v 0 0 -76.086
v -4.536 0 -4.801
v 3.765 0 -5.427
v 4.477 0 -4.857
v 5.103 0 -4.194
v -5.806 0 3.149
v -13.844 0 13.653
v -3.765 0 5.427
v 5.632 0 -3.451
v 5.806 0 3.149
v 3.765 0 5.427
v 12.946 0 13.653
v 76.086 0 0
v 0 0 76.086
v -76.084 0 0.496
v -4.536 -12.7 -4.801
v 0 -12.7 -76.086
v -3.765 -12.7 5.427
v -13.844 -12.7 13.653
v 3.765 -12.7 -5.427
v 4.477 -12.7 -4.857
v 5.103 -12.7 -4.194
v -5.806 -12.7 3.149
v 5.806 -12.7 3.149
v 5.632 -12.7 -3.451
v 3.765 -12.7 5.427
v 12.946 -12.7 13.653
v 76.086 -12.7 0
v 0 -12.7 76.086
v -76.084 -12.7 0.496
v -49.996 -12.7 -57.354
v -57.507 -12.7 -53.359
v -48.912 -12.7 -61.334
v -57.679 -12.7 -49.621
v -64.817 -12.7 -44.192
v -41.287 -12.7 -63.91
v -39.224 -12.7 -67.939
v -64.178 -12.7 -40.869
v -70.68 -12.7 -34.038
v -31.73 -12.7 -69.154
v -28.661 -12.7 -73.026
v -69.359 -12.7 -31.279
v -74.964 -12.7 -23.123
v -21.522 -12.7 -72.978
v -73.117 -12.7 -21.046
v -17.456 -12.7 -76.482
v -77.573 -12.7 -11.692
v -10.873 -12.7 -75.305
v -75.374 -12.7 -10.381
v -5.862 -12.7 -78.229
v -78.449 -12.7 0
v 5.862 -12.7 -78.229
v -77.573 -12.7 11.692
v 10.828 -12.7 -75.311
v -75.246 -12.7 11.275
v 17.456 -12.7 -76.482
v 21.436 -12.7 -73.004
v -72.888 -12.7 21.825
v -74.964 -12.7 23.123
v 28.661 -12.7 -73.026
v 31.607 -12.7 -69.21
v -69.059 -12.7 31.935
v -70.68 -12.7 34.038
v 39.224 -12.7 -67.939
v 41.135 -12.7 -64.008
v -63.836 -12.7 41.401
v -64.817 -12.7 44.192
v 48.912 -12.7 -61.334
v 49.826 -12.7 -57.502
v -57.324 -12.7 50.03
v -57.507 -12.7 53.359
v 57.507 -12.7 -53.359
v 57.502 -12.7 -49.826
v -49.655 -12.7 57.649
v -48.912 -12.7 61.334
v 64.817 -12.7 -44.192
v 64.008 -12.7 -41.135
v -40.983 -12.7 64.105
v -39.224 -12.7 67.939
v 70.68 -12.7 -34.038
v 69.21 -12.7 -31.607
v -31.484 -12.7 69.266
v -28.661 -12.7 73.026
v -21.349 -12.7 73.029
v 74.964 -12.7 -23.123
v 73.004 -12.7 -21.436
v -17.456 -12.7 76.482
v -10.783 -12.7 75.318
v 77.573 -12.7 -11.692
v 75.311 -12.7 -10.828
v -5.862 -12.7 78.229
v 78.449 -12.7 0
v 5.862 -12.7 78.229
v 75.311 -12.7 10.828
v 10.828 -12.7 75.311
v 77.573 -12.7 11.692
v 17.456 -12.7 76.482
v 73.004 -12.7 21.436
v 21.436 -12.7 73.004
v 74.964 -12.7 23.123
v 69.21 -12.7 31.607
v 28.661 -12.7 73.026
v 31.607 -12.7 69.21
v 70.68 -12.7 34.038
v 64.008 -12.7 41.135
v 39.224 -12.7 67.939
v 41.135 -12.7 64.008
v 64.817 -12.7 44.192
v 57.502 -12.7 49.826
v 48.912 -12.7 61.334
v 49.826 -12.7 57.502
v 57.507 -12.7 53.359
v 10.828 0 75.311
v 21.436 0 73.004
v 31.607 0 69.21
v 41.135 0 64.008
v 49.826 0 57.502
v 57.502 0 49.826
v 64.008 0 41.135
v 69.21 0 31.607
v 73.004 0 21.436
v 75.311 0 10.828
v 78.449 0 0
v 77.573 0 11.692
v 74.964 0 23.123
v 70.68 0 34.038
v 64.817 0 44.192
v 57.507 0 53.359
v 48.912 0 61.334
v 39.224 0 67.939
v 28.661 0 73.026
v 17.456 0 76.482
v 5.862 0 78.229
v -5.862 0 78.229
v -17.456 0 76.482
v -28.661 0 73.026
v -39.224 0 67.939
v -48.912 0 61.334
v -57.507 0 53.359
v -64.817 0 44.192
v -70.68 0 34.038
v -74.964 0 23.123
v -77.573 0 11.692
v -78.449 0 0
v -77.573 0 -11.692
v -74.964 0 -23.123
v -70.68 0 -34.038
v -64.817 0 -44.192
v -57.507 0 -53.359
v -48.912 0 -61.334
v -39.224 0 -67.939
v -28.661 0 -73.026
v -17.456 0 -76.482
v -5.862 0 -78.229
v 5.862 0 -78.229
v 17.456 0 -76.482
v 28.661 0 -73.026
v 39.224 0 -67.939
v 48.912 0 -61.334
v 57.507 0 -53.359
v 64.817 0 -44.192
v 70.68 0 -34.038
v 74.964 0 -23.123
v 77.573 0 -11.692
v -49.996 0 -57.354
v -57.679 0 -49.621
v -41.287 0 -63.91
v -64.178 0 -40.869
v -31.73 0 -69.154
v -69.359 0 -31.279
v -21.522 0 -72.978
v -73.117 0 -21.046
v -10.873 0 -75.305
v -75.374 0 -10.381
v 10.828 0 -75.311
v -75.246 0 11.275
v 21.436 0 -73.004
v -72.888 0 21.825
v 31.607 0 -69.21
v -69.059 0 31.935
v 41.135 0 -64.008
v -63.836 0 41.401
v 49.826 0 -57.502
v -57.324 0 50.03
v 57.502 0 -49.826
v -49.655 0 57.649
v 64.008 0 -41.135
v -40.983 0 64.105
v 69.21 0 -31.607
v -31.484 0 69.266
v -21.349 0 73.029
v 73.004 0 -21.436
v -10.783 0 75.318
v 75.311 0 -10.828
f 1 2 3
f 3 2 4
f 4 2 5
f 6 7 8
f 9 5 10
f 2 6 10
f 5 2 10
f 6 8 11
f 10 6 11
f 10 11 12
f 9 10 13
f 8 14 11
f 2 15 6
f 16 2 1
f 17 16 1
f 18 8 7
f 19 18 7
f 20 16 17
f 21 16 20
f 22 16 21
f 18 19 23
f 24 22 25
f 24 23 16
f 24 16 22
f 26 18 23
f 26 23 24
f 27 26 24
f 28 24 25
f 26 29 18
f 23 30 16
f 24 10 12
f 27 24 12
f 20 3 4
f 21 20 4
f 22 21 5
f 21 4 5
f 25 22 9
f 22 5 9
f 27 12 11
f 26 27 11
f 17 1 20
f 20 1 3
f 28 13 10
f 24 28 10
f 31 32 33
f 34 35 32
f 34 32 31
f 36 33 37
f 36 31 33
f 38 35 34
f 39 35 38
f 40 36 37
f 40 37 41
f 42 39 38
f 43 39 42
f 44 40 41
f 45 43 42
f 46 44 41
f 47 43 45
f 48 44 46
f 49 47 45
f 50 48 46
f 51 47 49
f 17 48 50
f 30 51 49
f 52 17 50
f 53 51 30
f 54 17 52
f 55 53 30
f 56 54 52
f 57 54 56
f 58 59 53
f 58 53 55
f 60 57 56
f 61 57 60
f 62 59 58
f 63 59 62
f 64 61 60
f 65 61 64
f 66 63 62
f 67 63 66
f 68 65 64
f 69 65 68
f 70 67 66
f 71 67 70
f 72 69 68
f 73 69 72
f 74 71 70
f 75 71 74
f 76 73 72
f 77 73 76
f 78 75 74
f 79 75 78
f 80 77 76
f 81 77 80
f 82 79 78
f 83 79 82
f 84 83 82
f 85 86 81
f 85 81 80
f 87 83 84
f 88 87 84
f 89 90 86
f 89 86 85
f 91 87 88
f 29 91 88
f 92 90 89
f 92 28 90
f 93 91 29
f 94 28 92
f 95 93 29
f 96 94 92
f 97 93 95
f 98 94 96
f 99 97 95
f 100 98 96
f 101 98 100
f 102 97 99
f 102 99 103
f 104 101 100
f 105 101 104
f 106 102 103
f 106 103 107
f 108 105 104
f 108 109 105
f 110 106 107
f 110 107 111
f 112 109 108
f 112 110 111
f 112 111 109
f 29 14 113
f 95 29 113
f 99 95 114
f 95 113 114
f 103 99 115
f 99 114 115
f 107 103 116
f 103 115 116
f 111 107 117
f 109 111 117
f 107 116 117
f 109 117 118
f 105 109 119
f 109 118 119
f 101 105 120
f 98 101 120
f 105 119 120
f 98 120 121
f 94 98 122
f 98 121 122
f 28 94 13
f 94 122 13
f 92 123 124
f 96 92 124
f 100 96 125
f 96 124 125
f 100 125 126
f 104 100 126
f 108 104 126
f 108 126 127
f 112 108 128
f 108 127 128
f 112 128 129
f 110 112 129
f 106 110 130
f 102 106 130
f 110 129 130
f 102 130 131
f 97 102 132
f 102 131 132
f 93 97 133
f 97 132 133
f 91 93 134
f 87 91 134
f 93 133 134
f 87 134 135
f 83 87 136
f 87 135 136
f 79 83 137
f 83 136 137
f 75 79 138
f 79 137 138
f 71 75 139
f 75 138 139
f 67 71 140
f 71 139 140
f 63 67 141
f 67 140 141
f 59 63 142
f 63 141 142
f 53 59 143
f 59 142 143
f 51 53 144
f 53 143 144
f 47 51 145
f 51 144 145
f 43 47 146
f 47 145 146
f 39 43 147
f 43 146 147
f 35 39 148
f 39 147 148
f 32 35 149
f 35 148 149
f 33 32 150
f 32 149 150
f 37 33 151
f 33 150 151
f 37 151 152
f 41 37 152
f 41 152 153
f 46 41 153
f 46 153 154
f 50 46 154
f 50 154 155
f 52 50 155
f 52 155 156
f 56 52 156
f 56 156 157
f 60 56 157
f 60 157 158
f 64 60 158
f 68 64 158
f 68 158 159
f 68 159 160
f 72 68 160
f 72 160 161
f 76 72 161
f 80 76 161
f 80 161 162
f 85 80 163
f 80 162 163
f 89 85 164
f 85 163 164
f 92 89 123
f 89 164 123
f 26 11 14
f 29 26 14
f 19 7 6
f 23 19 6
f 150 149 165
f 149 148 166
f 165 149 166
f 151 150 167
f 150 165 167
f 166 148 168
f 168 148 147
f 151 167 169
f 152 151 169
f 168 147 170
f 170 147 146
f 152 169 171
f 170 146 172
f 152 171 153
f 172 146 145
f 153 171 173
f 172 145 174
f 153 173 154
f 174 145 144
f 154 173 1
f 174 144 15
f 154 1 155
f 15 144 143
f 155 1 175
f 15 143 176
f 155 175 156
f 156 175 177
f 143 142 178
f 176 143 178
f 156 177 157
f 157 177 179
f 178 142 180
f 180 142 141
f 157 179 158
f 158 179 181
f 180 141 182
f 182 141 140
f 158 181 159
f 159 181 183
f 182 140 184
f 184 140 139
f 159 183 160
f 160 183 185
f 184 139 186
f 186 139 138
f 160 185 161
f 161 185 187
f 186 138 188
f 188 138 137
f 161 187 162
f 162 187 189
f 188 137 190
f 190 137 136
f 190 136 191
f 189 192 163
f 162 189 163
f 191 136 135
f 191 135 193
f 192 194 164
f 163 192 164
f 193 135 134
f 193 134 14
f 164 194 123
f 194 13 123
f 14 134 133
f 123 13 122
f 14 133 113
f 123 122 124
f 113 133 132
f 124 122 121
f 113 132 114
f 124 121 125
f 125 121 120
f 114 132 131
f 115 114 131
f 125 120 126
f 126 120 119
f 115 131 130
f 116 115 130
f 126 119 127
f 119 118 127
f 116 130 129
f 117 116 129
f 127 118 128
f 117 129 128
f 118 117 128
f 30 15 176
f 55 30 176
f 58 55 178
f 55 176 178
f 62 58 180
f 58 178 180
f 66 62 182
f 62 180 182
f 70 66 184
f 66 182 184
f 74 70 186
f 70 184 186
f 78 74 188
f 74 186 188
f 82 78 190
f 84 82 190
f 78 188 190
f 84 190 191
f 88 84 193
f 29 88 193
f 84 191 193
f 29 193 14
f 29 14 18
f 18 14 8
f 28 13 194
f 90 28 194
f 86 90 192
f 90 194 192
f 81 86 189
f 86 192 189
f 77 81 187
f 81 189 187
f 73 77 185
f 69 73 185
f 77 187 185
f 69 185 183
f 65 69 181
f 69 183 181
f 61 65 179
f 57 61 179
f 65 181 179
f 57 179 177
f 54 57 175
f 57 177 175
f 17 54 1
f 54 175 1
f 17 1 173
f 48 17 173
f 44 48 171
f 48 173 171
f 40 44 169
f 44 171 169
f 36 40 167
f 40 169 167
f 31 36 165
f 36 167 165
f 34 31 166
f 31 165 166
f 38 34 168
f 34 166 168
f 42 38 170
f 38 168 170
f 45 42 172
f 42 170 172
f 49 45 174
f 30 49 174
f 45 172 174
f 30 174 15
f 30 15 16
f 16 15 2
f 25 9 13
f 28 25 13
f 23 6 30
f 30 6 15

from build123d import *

# Parameters (mm, degrees)
F1_DEPTH = 12.7
F0_R     = 78.4487884366


with BuildPart() as f1:
    # F0 (on Front) → F1 (new body)
    with BuildSketch(Plane.XZ):
        with BuildLine():
            Line((5.6320258197, -3.4509532399), (76.0859069982, 0))
            Line((76.0859069982, 0), (5.8060802368, 3.149321416))
            Line((5.8060802368, 3.149321416), (12.946058248, 13.6532578617))
            Line((12.946058248, 13.6532578617), (3.7652573822, 5.4269355942))
            Line((3.7652573822, 5.4269355942), (0, 76.0859069982))
            Line((0, 76.0859069982), (-3.7652573822, 5.4269355942))
            Line((-3.7652573822, 5.4269355942), (-13.8442134485, 13.6532578617))
            Line((-13.8442134485, 13.6532578617), (-5.8060802368, 3.149321416))
            Line((-5.8060802368, 3.149321416), (-76.0842881314, 0.4963298042))
            Line((-76.0842881314, 0.4963298042), (-4.5360151716, -4.8013914087))
            Line((-4.5360151716, -4.8013914087), (0, -76.0859069982))
            Line((0, -76.0859069982), (3.7652573822, -5.4269355942))
            ThreePointArc((3.7652573822, -5.4269355942), (4.8013914087, -4.5360151716), (5.6320258197, -3.4509532399))
        make_face()
    extrude(amount=F1_DEPTH)


with BuildPart() as f1b:
    # F0 (on Front) → F1, piece 2 (new body)
    with BuildSketch(Plane.XZ):
        Circle(F0_R)
        with BuildLine():
            ThreePointArc((0, 76.0859069982), (53.8008607911, 53.8008607911), (76.0859069982, 0))
            ThreePointArc((76.0859069982, 0), (53.8008607911, -53.8008607911), (0, -76.0859069982))
            ThreePointArc((0, -76.0859069982), (-53.976054631, -53.6250945939), (-76.0842881314, 0.4963298042))
            ThreePointArc((-76.0842881314, 0.4963298042), (-53.6250945939, 53.976054631), (0, 76.0859069982))
        make_face(mode=Mode.SUBTRACT)
    extrude(amount=F1_DEPTH)


solid = Compound([f1.part, f1b.part])
